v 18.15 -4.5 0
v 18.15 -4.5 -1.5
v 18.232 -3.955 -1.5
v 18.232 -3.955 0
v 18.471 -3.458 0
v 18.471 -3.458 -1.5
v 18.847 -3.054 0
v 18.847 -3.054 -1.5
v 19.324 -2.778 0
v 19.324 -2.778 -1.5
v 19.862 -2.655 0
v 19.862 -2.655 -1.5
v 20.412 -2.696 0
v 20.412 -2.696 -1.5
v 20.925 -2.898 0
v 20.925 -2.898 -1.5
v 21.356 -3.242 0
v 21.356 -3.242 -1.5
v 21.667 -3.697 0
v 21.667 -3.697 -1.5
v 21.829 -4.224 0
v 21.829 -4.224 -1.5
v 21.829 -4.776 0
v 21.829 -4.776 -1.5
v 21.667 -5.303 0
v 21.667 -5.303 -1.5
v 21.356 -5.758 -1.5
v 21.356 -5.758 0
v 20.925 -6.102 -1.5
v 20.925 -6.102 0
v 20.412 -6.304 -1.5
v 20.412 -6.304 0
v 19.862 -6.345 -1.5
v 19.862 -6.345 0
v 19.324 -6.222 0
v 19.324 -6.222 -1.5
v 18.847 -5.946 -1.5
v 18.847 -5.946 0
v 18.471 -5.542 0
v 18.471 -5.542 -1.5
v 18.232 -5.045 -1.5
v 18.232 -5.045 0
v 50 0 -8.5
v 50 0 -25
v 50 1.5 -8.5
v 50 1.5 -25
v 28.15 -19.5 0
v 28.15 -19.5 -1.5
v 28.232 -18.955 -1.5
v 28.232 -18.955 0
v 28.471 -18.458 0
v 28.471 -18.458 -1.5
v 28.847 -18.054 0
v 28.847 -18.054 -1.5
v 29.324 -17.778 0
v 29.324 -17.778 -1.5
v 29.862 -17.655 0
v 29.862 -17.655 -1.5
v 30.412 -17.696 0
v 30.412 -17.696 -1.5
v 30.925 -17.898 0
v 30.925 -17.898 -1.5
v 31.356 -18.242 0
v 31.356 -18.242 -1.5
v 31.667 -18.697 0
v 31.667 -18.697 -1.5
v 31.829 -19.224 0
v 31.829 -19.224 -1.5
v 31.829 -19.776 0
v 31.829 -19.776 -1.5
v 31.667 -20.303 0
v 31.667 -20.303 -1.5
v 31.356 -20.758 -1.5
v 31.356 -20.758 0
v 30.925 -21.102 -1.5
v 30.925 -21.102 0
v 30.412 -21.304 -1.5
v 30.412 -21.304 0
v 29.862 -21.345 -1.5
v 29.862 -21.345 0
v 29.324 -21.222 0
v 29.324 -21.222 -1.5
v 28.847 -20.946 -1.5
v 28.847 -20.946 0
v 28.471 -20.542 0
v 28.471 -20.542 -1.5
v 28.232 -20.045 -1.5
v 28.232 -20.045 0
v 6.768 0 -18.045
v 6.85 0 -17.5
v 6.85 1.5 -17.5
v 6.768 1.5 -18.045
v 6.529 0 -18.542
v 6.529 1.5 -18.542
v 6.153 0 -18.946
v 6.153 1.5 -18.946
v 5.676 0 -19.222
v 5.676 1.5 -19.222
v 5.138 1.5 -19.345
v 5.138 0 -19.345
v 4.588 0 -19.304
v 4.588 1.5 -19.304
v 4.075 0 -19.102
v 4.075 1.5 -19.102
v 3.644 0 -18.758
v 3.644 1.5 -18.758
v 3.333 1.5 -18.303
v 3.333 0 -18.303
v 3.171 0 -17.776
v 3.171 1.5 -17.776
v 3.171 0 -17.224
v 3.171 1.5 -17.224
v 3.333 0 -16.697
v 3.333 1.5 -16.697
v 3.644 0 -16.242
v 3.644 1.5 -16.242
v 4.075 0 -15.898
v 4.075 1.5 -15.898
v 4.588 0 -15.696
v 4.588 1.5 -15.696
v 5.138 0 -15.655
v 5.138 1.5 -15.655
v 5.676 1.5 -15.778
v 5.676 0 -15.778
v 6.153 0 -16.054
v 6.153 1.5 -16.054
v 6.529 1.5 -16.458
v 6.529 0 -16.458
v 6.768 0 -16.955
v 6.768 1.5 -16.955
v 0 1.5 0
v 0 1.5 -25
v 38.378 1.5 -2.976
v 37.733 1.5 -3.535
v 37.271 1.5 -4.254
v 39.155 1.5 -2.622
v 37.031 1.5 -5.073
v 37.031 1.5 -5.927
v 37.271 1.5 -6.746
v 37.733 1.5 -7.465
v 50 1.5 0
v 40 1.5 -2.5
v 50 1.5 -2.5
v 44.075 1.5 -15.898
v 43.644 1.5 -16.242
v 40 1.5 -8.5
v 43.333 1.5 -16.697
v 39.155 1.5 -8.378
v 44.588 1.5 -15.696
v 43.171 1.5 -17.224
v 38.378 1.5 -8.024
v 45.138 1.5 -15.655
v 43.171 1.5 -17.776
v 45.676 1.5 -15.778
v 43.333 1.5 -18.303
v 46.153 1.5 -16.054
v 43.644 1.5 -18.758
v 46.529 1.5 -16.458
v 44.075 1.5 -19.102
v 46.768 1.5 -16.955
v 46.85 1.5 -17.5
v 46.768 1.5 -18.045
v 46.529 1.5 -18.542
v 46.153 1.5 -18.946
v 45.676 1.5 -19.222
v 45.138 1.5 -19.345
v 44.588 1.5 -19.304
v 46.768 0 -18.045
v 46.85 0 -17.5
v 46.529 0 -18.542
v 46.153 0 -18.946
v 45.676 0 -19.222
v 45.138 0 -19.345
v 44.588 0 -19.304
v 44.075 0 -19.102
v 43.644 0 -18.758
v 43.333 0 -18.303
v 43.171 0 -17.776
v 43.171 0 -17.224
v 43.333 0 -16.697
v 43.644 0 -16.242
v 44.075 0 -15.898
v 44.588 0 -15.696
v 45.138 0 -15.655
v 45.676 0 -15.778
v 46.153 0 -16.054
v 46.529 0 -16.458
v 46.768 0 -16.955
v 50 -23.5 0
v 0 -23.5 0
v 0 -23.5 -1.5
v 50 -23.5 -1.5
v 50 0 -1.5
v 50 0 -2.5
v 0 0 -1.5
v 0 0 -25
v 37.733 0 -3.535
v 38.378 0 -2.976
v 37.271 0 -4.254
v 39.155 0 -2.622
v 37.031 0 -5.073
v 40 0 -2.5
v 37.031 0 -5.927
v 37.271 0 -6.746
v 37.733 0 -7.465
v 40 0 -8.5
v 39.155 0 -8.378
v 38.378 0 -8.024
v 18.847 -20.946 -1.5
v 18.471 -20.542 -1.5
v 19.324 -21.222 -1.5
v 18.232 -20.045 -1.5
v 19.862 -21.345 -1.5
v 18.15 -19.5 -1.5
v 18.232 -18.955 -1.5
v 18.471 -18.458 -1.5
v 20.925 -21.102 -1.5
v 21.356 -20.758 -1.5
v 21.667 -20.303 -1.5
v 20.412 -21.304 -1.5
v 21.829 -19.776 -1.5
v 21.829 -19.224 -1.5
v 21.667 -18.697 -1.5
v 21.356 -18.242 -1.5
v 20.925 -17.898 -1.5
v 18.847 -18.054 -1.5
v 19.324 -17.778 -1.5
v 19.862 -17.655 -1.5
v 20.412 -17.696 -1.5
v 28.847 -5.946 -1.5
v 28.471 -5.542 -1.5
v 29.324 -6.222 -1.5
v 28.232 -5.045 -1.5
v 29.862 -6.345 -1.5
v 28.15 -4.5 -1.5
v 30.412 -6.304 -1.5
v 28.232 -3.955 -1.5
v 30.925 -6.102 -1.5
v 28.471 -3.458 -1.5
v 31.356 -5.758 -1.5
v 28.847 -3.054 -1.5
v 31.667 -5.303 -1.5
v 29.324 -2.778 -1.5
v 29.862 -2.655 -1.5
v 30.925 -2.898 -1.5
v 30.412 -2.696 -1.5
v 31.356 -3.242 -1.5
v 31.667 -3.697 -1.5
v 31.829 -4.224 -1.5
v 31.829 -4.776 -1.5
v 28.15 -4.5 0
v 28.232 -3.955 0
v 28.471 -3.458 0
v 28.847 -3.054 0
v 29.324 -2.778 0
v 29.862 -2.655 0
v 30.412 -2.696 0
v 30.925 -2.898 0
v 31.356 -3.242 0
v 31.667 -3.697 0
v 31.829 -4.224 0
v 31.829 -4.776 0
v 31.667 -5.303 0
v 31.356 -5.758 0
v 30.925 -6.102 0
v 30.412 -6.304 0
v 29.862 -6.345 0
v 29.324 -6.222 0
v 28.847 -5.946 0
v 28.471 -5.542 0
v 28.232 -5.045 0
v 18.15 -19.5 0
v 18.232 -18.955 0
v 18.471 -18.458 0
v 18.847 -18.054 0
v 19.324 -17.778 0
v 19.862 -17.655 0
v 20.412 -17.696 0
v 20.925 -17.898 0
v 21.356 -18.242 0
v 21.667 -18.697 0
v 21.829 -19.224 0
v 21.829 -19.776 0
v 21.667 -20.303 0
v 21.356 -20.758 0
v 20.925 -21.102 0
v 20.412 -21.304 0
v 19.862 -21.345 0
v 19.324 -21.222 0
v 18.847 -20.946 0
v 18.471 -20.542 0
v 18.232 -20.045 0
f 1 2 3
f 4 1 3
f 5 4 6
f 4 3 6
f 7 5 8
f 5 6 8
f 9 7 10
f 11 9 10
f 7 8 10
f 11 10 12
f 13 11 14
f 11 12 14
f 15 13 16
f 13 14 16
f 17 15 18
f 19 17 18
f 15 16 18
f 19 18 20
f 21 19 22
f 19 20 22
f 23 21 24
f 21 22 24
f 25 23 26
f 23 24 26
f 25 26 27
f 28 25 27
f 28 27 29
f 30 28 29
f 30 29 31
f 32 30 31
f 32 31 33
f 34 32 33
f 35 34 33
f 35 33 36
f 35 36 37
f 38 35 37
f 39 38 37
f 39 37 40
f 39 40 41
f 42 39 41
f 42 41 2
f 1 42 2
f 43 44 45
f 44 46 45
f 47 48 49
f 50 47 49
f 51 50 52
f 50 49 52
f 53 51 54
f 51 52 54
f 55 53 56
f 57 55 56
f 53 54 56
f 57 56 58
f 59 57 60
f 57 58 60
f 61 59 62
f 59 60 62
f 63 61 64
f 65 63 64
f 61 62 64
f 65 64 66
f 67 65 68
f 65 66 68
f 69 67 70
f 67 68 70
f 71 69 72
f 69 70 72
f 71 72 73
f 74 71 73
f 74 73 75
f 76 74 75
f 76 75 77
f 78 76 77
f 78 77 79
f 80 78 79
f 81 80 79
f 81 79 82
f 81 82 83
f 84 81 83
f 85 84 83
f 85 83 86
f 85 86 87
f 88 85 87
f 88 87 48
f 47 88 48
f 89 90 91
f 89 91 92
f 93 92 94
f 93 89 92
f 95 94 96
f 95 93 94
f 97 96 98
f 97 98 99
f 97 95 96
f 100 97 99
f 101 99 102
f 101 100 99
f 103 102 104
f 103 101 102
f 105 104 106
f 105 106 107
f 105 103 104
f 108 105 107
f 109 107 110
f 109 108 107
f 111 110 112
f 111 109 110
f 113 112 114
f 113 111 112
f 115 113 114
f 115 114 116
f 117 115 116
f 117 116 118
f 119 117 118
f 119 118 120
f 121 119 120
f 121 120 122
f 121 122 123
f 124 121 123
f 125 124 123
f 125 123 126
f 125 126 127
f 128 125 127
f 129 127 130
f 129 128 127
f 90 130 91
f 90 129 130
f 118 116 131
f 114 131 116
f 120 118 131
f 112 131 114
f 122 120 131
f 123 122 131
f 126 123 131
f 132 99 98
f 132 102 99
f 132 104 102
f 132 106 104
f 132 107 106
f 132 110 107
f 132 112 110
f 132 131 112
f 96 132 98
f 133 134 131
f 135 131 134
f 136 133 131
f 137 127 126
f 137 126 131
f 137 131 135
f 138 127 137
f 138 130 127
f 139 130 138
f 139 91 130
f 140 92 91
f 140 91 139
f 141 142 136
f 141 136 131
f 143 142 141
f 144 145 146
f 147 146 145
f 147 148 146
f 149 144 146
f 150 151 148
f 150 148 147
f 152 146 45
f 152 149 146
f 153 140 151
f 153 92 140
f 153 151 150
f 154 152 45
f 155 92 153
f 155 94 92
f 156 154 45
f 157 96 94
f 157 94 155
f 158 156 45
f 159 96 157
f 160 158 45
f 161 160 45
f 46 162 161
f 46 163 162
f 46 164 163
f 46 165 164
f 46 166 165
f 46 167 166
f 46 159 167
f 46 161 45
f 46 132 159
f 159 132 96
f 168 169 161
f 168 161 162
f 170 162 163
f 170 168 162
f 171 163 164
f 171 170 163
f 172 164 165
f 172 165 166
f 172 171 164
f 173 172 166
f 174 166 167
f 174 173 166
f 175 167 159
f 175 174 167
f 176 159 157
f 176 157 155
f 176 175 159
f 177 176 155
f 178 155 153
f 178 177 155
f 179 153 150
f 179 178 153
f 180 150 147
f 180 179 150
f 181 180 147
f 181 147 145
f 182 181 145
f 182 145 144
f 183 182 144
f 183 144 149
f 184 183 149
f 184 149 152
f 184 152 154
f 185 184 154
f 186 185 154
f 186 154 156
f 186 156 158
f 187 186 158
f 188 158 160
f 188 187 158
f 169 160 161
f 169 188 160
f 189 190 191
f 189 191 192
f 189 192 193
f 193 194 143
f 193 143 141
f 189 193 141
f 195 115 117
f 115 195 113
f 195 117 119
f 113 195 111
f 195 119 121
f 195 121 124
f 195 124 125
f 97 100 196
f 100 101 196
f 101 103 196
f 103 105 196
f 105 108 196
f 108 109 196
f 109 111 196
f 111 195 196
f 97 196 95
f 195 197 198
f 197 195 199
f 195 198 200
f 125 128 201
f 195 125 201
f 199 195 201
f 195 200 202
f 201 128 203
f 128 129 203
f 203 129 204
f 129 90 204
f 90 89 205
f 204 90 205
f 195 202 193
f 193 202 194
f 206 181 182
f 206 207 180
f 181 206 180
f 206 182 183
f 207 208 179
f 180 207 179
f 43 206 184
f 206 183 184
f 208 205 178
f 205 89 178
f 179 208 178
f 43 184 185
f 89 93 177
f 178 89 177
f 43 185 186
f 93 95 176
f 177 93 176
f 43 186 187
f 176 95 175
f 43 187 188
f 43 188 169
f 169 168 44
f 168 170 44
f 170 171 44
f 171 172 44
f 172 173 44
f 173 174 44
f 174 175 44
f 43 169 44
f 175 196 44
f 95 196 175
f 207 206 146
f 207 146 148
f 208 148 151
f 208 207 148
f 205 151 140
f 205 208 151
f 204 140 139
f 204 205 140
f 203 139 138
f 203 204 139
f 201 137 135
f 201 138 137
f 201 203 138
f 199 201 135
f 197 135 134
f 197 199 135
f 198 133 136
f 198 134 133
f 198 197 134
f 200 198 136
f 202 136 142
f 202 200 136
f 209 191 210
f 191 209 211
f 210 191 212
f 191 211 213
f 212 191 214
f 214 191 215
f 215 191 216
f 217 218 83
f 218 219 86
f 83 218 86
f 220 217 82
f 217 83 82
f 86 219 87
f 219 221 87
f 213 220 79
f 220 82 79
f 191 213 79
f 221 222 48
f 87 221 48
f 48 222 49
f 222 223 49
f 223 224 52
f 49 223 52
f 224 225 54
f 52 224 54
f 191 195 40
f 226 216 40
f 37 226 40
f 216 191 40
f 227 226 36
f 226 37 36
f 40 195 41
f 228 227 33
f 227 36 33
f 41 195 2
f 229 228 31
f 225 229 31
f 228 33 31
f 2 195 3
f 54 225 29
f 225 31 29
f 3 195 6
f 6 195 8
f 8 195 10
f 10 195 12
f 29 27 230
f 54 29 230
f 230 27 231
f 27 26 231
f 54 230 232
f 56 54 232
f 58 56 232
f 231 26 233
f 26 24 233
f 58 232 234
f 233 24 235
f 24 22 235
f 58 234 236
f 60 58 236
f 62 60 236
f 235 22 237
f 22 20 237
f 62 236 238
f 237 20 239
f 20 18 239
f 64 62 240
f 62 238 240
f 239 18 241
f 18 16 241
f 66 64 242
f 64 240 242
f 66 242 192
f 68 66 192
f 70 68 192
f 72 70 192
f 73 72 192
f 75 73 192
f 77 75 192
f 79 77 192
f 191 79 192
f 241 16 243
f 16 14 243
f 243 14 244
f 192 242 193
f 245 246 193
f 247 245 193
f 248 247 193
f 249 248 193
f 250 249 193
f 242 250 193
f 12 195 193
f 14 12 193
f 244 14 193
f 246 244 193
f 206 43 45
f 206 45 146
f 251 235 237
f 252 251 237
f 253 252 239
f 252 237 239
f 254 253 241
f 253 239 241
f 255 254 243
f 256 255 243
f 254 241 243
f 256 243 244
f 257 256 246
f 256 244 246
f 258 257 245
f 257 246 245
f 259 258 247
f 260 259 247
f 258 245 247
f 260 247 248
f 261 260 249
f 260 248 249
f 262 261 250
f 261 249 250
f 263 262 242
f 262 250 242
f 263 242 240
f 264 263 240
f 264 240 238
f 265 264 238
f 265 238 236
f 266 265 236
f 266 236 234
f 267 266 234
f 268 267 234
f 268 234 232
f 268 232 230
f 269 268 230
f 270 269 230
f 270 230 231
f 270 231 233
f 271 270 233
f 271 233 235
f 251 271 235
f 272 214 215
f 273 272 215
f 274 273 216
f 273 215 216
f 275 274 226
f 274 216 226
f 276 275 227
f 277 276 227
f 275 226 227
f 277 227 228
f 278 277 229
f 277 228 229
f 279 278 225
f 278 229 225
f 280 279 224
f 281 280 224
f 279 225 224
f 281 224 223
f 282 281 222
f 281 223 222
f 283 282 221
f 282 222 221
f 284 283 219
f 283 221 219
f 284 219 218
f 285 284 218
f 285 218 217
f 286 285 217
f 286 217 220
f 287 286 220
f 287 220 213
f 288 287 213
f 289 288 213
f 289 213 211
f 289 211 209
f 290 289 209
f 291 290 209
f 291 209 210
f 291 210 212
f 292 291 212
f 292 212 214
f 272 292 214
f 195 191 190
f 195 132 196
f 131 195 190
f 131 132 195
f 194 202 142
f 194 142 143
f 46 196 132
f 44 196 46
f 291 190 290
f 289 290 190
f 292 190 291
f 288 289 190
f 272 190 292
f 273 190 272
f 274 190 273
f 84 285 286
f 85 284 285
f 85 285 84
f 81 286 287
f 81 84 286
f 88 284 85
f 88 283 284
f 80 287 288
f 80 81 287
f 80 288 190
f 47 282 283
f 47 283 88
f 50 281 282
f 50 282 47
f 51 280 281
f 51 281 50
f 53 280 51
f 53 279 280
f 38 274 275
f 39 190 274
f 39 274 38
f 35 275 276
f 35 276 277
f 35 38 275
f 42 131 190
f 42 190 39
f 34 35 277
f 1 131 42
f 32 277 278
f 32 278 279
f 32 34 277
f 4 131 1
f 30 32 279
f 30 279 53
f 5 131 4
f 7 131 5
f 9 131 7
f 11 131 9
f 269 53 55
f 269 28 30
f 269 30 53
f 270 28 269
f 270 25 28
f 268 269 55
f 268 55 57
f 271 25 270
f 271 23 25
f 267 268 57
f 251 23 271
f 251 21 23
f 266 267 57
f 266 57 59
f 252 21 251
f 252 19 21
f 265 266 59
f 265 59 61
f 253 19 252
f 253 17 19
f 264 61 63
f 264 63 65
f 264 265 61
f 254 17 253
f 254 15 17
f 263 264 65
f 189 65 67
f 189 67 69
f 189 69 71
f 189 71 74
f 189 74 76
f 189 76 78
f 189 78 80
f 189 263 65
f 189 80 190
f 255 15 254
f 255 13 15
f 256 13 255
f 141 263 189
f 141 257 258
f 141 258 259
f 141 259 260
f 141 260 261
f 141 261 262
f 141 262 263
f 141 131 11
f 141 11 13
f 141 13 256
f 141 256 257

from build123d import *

# Parameters (mm, degrees)
SKETCH1_W           = 50
SKETCH1_H           = 25
SKETCH1_R           = 1.85
BOSS_EXTRUDE1_DEPTH = 1.5
SKETCH2_W           = 50
SKETCH2_H           = 1.5
BOSS_EXTRUDE2_DEPTH = 23.5
SKETCH3_R           = 1.85
CUT_EXTRUDE1_DEPTH  = 23.5
CUT_EXTRUDE2_DEPTH  = 10


with BuildPart() as part:
    # Sketch1 → Boss-Extrude1 (new body)
    with BuildSketch(Plane(origin=(0, 0, 0), x_dir=(1, 0, 0), z_dir=(0, 1, 0))):
        with Locations((25, 12.5)):
            Rectangle(SKETCH1_W, SKETCH1_H)
        with Locations((5, 17.5)):
            Circle(SKETCH1_R, mode=Mode.SUBTRACT)
        with Locations((45, 17.5)):
            Circle(SKETCH1_R, mode=Mode.SUBTRACT)
    extrude(amount=BOSS_EXTRUDE1_DEPTH)

    # Sketch2 → Boss-Extrude2 (add)
    with BuildSketch(Plane.XZ):
        with Locations((25, -0.75)):
            Rectangle(SKETCH2_W, SKETCH2_H)
    extrude(amount=BOSS_EXTRUDE2_DEPTH)

    # Sketch3 → Cut-Extrude1 (cut)
    with BuildSketch(Plane(origin=(0, 0, -1.5), x_dir=(-1, 0, 0), z_dir=(0, 0, -1))):
        with Locations((-20, -19.5)):
            Circle(SKETCH3_R)
        with Locations((-30, -19.5)):
            Circle(SKETCH3_R)
        with Locations((-20, -4.5)):
            Circle(SKETCH3_R)
        with Locations((-30, -4.5)):
            Circle(SKETCH3_R)
    extrude(amount=-CUT_EXTRUDE1_DEPTH, mode=Mode.SUBTRACT)

    # Sketch4 → Cut-Extrude2 (cut)
    with BuildSketch(Plane.XZ):
        with BuildLine():
            Line((50, -8.5), (40, -8.5))
            ThreePointArc((40, -8.5), (37, -5.5), (40, -2.5))
            Line((40, -2.5), (50, -2.5))
            ThreePointArc((50, -2.5), (53, -5.5), (50, -8.5))
        make_face()
    extrude(amount=-CUT_EXTRUDE2_DEPTH, mode=Mode.SUBTRACT)


solid = part.part
